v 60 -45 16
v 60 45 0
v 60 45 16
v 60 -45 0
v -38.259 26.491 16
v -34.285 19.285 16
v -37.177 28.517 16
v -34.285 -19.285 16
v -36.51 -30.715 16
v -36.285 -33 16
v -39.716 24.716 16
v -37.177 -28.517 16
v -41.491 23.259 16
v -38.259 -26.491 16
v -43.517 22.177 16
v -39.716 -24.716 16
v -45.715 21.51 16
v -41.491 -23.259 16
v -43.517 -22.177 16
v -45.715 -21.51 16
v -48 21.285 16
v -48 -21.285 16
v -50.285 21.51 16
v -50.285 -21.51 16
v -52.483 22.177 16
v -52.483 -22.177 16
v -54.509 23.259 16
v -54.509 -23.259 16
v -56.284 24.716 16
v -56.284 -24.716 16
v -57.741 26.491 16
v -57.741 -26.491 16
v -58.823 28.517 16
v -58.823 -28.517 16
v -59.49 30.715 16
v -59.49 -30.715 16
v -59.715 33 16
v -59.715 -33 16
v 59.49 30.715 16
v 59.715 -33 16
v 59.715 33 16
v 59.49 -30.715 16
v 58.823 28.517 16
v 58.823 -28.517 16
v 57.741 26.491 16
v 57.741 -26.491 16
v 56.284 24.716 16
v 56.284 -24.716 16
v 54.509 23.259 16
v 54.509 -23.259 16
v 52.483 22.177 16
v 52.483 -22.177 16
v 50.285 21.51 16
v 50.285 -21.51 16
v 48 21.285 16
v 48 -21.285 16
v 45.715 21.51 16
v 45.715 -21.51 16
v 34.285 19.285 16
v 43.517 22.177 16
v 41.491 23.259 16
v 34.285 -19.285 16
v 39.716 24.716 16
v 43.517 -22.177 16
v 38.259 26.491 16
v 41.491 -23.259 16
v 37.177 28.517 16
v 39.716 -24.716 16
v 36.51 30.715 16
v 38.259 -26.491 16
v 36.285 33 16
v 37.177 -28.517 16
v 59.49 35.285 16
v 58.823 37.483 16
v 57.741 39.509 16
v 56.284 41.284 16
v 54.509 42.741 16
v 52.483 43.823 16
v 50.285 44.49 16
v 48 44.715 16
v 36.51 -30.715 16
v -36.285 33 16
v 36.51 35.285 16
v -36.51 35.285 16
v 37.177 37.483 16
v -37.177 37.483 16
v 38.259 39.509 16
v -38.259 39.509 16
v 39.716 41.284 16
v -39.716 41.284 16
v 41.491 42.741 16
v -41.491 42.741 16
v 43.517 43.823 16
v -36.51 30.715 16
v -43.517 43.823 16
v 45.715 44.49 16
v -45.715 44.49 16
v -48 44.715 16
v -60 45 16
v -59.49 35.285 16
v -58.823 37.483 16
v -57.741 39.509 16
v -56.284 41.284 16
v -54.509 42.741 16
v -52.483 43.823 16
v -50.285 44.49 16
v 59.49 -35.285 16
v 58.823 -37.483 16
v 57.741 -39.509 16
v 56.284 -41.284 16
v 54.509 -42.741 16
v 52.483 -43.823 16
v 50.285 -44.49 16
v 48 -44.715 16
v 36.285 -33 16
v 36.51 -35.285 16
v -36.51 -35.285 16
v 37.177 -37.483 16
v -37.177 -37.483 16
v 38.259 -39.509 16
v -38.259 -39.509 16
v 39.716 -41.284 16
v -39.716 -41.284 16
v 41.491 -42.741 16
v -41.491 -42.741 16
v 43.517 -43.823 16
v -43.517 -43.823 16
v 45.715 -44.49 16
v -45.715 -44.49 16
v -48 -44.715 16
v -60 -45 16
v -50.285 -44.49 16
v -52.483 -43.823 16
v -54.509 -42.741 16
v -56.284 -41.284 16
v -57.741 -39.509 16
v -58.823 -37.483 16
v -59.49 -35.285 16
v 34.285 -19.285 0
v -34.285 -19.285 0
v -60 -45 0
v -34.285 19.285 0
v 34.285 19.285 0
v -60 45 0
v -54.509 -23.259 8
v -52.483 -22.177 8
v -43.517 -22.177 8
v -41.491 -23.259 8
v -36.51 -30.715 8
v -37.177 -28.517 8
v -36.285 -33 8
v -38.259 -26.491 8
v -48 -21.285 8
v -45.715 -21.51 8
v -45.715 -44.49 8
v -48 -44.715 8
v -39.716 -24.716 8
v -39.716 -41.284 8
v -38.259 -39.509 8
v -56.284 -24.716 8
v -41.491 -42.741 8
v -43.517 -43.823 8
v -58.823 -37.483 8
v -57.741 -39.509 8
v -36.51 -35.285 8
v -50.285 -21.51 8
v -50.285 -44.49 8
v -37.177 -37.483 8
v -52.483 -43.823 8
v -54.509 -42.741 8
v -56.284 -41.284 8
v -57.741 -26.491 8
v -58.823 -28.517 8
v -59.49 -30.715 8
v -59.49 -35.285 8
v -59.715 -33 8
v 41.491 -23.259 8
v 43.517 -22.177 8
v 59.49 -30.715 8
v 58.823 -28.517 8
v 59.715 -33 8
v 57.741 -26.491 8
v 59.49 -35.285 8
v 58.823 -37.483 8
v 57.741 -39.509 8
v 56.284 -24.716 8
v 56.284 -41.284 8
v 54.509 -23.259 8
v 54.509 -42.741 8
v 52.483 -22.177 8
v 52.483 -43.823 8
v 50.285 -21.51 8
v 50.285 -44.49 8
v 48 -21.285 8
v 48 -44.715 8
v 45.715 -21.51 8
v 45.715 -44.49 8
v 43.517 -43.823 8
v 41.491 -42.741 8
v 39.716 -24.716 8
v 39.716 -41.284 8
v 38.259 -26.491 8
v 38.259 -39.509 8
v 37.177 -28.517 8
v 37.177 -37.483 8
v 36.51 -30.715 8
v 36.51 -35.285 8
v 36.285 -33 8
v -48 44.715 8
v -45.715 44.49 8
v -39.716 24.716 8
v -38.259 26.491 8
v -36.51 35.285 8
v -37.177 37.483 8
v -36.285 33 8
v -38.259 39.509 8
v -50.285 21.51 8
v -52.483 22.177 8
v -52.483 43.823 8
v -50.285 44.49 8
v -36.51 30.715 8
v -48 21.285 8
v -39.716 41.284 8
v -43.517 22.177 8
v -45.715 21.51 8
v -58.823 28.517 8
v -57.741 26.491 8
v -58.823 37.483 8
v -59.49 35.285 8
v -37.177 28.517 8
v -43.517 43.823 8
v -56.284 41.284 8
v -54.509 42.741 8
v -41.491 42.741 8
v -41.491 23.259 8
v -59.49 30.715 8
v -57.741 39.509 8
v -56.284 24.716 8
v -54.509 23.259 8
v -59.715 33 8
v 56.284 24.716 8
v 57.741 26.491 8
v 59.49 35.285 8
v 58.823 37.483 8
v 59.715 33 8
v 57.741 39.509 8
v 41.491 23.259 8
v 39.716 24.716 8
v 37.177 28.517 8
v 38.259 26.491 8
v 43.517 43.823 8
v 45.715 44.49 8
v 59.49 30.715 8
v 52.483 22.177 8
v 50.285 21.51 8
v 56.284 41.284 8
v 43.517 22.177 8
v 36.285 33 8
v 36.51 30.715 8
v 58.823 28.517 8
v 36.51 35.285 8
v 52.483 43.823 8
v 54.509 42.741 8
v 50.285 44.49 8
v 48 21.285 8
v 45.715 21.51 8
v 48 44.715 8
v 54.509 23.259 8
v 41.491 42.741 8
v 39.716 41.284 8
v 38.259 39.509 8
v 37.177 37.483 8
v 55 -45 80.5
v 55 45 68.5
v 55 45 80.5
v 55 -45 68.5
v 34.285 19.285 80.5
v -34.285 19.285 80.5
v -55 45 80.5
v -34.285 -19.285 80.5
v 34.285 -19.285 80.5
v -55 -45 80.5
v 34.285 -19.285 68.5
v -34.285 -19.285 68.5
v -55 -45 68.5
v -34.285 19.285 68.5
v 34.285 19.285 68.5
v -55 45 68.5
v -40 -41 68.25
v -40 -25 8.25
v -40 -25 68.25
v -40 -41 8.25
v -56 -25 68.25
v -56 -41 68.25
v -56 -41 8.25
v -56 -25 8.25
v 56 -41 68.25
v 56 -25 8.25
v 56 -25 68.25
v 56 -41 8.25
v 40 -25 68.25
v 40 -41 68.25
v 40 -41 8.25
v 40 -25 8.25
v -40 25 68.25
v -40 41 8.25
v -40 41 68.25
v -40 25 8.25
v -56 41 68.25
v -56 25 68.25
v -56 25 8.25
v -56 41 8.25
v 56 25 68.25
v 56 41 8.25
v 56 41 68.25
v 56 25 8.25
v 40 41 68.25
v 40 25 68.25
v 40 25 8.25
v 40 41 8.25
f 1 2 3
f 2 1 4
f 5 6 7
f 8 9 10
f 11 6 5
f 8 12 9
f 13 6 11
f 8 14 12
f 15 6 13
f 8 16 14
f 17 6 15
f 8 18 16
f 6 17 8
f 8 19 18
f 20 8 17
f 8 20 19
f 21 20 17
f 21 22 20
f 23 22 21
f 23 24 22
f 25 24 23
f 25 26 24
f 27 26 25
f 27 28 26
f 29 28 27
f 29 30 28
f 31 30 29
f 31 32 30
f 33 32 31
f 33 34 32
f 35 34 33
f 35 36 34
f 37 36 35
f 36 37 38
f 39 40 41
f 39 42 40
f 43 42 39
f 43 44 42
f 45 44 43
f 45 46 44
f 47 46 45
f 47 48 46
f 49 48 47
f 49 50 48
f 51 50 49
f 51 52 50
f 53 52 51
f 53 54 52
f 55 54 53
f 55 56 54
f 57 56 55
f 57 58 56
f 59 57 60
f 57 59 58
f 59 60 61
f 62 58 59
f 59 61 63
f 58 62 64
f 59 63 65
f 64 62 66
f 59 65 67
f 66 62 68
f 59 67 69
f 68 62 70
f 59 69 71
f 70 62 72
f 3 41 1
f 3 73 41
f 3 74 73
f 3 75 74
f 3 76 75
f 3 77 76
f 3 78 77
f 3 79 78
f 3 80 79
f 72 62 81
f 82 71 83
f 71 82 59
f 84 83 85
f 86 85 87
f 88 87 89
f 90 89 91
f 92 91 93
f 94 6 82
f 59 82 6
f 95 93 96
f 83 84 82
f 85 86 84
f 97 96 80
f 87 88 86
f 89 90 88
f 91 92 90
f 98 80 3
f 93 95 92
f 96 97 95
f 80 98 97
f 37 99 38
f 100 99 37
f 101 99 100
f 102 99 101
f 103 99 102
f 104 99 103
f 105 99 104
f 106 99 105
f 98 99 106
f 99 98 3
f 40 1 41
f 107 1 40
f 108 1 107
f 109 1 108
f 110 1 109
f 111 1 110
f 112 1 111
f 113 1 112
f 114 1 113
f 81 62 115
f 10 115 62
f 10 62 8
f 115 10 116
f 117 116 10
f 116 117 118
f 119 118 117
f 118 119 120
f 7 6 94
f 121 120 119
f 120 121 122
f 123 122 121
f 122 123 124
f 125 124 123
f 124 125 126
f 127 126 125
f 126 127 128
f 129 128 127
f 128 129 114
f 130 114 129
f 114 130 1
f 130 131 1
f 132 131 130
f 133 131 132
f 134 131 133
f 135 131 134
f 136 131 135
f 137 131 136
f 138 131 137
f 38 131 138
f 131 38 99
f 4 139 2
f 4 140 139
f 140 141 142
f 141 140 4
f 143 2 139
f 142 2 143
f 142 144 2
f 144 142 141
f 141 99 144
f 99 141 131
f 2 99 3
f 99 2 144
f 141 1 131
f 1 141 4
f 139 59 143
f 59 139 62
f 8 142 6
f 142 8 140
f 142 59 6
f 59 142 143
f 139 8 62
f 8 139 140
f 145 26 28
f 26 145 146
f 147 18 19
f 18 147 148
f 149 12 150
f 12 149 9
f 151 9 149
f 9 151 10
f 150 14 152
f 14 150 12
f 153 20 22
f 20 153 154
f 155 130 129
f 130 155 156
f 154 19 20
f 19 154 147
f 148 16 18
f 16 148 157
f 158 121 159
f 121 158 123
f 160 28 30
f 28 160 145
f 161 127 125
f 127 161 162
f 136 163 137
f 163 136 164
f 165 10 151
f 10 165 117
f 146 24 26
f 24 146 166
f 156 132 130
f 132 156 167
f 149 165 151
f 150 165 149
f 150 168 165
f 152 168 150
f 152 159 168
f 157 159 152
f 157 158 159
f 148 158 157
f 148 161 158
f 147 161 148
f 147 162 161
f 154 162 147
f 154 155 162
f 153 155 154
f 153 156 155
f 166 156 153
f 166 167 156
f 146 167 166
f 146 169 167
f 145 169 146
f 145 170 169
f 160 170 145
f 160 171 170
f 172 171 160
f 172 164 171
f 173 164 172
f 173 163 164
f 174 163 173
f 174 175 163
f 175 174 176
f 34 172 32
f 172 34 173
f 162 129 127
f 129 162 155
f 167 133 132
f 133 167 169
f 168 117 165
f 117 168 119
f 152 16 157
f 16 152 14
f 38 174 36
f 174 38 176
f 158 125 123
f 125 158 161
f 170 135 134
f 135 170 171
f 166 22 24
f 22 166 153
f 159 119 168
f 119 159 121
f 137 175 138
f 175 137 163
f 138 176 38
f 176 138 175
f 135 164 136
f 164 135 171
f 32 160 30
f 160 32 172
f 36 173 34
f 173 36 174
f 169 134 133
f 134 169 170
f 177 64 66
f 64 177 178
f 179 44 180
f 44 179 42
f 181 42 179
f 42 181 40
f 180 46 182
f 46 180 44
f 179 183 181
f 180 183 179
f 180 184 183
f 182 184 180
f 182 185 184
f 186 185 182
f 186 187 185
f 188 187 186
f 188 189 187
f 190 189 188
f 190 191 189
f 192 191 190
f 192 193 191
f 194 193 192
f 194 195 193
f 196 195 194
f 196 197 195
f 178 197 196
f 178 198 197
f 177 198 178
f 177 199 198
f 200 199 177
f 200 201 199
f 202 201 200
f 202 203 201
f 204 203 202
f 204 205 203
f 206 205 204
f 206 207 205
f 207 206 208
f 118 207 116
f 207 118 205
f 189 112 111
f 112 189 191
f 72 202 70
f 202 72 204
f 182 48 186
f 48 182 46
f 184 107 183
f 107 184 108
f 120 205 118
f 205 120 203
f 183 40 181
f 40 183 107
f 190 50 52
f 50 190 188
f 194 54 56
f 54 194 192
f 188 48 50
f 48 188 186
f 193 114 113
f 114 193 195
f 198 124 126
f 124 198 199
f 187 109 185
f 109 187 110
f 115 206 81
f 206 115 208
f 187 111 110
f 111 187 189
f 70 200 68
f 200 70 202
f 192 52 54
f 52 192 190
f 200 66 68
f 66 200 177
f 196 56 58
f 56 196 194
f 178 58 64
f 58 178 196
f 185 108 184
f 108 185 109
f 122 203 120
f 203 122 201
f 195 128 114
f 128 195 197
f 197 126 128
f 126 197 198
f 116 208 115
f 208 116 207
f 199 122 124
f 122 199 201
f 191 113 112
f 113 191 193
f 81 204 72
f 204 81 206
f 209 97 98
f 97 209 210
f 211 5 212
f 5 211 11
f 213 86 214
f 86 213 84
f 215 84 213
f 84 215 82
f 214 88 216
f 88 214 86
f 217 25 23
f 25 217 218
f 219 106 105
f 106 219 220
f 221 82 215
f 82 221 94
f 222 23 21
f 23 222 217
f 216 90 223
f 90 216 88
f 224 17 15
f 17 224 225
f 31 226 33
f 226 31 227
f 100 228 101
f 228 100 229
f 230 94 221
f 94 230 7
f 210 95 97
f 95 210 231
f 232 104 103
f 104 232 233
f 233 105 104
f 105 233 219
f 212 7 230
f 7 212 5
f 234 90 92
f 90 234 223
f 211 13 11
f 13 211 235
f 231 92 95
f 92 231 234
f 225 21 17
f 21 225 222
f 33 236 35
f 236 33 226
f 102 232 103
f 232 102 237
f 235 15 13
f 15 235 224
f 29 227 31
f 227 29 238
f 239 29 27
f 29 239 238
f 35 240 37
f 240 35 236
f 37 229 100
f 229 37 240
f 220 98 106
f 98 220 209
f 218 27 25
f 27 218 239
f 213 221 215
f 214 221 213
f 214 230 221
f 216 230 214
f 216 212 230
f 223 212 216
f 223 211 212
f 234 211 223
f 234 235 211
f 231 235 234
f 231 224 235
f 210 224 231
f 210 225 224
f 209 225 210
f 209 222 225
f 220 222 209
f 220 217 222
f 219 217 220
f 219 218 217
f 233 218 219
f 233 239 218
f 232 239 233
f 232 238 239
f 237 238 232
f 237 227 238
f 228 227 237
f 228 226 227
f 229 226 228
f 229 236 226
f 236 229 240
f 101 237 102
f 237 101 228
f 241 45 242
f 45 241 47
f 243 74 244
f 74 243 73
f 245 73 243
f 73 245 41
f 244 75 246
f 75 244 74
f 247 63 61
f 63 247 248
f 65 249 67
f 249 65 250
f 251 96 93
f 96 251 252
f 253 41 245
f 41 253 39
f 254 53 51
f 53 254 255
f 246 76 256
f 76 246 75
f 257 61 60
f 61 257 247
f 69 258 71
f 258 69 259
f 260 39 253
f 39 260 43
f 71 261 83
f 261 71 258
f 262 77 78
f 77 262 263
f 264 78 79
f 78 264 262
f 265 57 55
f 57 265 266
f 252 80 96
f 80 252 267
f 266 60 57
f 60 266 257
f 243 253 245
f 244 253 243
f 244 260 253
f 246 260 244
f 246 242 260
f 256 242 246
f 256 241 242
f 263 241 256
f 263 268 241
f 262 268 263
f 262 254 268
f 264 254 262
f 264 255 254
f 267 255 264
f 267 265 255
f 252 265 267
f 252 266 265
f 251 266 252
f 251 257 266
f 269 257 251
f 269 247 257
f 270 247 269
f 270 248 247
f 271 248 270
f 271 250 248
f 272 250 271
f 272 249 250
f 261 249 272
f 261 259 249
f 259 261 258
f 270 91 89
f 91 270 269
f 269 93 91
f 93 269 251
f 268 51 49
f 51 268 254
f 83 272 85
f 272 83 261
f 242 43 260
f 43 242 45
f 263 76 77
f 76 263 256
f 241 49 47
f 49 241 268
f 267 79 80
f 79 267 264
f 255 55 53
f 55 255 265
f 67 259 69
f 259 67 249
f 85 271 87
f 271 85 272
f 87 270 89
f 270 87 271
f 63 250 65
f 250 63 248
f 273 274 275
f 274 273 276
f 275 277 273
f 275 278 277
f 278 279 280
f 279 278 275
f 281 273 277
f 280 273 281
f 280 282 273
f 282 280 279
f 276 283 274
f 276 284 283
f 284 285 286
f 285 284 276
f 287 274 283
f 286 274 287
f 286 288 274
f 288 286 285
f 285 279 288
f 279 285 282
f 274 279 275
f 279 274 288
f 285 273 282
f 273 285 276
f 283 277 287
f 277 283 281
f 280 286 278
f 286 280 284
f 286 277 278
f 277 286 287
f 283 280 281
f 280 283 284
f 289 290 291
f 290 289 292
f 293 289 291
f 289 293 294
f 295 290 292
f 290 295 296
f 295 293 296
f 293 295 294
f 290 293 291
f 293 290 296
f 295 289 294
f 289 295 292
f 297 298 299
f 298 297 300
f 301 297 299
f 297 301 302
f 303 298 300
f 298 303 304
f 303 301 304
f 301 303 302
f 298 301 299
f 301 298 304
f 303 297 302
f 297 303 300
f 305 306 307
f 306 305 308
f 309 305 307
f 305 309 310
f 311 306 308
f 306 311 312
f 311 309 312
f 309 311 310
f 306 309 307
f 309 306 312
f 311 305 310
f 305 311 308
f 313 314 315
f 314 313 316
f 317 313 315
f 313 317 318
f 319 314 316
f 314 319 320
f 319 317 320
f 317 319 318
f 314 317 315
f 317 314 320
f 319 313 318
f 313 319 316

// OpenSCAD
$fn = 32;

// ------------------------------------------------------------------------
// Frame cube: base 120 x 90 mm, posts 60 mm tall
// Every part is its own module, assembly() places every instance.
// ------------------------------------------------------------------------

// --- part 1 ---
module base_frame() {
  difference() {
    translate([-60, -45, 0]) cube([120, 90, 16]);
    translate([-34.285, -19.285, -1]) cube([68.57, 38.57, 18]);
    translate([-48, -33, 8]) cylinder(h = 9, d = 23.43);
    translate([48, -33, 8]) cylinder(h = 9, d = 23.43);
    translate([-48, 33, 8]) cylinder(h = 9, d = 23.43);
    translate([48, 33, 8]) cylinder(h = 9, d = 23.43);
  }
}

// --- part 2 ---
module corner_post() {
  translate([-8, -8, 0]) cube([16, 16, 60]);
}

// --- part 3 ---
module top_frame() {
  difference() {
    translate([-55, -45, 0]) cube([110, 90, 12]);
    translate([-34.285, -19.285, -1]) cube([68.57, 38.57, 14]);
  }
}

// --- assembly ---
module assembly() {
  color([0.80, 0.24, 0.20]) translate([0, 0, 0]) rotate([0, 0, 0]) base_frame();
  color([0.20, 0.45, 0.75]) translate([-48, -33, 8.25]) rotate([0, 0, 0]) corner_post();
  color([0.25, 0.62, 0.32]) translate([48, -33, 8.25]) rotate([0, 0, 0]) corner_post();
  color([0.92, 0.70, 0.18]) translate([-48, 33, 8.25]) rotate([0, 0, 0]) corner_post();
  color([0.58, 0.35, 0.70]) translate([48, 33, 8.25]) rotate([0, 0, 0]) corner_post();
  color([0.16, 0.66, 0.66]) translate([0, 0, 68.5]) rotate([0, 0, 0]) top_frame();
}

assembly();
